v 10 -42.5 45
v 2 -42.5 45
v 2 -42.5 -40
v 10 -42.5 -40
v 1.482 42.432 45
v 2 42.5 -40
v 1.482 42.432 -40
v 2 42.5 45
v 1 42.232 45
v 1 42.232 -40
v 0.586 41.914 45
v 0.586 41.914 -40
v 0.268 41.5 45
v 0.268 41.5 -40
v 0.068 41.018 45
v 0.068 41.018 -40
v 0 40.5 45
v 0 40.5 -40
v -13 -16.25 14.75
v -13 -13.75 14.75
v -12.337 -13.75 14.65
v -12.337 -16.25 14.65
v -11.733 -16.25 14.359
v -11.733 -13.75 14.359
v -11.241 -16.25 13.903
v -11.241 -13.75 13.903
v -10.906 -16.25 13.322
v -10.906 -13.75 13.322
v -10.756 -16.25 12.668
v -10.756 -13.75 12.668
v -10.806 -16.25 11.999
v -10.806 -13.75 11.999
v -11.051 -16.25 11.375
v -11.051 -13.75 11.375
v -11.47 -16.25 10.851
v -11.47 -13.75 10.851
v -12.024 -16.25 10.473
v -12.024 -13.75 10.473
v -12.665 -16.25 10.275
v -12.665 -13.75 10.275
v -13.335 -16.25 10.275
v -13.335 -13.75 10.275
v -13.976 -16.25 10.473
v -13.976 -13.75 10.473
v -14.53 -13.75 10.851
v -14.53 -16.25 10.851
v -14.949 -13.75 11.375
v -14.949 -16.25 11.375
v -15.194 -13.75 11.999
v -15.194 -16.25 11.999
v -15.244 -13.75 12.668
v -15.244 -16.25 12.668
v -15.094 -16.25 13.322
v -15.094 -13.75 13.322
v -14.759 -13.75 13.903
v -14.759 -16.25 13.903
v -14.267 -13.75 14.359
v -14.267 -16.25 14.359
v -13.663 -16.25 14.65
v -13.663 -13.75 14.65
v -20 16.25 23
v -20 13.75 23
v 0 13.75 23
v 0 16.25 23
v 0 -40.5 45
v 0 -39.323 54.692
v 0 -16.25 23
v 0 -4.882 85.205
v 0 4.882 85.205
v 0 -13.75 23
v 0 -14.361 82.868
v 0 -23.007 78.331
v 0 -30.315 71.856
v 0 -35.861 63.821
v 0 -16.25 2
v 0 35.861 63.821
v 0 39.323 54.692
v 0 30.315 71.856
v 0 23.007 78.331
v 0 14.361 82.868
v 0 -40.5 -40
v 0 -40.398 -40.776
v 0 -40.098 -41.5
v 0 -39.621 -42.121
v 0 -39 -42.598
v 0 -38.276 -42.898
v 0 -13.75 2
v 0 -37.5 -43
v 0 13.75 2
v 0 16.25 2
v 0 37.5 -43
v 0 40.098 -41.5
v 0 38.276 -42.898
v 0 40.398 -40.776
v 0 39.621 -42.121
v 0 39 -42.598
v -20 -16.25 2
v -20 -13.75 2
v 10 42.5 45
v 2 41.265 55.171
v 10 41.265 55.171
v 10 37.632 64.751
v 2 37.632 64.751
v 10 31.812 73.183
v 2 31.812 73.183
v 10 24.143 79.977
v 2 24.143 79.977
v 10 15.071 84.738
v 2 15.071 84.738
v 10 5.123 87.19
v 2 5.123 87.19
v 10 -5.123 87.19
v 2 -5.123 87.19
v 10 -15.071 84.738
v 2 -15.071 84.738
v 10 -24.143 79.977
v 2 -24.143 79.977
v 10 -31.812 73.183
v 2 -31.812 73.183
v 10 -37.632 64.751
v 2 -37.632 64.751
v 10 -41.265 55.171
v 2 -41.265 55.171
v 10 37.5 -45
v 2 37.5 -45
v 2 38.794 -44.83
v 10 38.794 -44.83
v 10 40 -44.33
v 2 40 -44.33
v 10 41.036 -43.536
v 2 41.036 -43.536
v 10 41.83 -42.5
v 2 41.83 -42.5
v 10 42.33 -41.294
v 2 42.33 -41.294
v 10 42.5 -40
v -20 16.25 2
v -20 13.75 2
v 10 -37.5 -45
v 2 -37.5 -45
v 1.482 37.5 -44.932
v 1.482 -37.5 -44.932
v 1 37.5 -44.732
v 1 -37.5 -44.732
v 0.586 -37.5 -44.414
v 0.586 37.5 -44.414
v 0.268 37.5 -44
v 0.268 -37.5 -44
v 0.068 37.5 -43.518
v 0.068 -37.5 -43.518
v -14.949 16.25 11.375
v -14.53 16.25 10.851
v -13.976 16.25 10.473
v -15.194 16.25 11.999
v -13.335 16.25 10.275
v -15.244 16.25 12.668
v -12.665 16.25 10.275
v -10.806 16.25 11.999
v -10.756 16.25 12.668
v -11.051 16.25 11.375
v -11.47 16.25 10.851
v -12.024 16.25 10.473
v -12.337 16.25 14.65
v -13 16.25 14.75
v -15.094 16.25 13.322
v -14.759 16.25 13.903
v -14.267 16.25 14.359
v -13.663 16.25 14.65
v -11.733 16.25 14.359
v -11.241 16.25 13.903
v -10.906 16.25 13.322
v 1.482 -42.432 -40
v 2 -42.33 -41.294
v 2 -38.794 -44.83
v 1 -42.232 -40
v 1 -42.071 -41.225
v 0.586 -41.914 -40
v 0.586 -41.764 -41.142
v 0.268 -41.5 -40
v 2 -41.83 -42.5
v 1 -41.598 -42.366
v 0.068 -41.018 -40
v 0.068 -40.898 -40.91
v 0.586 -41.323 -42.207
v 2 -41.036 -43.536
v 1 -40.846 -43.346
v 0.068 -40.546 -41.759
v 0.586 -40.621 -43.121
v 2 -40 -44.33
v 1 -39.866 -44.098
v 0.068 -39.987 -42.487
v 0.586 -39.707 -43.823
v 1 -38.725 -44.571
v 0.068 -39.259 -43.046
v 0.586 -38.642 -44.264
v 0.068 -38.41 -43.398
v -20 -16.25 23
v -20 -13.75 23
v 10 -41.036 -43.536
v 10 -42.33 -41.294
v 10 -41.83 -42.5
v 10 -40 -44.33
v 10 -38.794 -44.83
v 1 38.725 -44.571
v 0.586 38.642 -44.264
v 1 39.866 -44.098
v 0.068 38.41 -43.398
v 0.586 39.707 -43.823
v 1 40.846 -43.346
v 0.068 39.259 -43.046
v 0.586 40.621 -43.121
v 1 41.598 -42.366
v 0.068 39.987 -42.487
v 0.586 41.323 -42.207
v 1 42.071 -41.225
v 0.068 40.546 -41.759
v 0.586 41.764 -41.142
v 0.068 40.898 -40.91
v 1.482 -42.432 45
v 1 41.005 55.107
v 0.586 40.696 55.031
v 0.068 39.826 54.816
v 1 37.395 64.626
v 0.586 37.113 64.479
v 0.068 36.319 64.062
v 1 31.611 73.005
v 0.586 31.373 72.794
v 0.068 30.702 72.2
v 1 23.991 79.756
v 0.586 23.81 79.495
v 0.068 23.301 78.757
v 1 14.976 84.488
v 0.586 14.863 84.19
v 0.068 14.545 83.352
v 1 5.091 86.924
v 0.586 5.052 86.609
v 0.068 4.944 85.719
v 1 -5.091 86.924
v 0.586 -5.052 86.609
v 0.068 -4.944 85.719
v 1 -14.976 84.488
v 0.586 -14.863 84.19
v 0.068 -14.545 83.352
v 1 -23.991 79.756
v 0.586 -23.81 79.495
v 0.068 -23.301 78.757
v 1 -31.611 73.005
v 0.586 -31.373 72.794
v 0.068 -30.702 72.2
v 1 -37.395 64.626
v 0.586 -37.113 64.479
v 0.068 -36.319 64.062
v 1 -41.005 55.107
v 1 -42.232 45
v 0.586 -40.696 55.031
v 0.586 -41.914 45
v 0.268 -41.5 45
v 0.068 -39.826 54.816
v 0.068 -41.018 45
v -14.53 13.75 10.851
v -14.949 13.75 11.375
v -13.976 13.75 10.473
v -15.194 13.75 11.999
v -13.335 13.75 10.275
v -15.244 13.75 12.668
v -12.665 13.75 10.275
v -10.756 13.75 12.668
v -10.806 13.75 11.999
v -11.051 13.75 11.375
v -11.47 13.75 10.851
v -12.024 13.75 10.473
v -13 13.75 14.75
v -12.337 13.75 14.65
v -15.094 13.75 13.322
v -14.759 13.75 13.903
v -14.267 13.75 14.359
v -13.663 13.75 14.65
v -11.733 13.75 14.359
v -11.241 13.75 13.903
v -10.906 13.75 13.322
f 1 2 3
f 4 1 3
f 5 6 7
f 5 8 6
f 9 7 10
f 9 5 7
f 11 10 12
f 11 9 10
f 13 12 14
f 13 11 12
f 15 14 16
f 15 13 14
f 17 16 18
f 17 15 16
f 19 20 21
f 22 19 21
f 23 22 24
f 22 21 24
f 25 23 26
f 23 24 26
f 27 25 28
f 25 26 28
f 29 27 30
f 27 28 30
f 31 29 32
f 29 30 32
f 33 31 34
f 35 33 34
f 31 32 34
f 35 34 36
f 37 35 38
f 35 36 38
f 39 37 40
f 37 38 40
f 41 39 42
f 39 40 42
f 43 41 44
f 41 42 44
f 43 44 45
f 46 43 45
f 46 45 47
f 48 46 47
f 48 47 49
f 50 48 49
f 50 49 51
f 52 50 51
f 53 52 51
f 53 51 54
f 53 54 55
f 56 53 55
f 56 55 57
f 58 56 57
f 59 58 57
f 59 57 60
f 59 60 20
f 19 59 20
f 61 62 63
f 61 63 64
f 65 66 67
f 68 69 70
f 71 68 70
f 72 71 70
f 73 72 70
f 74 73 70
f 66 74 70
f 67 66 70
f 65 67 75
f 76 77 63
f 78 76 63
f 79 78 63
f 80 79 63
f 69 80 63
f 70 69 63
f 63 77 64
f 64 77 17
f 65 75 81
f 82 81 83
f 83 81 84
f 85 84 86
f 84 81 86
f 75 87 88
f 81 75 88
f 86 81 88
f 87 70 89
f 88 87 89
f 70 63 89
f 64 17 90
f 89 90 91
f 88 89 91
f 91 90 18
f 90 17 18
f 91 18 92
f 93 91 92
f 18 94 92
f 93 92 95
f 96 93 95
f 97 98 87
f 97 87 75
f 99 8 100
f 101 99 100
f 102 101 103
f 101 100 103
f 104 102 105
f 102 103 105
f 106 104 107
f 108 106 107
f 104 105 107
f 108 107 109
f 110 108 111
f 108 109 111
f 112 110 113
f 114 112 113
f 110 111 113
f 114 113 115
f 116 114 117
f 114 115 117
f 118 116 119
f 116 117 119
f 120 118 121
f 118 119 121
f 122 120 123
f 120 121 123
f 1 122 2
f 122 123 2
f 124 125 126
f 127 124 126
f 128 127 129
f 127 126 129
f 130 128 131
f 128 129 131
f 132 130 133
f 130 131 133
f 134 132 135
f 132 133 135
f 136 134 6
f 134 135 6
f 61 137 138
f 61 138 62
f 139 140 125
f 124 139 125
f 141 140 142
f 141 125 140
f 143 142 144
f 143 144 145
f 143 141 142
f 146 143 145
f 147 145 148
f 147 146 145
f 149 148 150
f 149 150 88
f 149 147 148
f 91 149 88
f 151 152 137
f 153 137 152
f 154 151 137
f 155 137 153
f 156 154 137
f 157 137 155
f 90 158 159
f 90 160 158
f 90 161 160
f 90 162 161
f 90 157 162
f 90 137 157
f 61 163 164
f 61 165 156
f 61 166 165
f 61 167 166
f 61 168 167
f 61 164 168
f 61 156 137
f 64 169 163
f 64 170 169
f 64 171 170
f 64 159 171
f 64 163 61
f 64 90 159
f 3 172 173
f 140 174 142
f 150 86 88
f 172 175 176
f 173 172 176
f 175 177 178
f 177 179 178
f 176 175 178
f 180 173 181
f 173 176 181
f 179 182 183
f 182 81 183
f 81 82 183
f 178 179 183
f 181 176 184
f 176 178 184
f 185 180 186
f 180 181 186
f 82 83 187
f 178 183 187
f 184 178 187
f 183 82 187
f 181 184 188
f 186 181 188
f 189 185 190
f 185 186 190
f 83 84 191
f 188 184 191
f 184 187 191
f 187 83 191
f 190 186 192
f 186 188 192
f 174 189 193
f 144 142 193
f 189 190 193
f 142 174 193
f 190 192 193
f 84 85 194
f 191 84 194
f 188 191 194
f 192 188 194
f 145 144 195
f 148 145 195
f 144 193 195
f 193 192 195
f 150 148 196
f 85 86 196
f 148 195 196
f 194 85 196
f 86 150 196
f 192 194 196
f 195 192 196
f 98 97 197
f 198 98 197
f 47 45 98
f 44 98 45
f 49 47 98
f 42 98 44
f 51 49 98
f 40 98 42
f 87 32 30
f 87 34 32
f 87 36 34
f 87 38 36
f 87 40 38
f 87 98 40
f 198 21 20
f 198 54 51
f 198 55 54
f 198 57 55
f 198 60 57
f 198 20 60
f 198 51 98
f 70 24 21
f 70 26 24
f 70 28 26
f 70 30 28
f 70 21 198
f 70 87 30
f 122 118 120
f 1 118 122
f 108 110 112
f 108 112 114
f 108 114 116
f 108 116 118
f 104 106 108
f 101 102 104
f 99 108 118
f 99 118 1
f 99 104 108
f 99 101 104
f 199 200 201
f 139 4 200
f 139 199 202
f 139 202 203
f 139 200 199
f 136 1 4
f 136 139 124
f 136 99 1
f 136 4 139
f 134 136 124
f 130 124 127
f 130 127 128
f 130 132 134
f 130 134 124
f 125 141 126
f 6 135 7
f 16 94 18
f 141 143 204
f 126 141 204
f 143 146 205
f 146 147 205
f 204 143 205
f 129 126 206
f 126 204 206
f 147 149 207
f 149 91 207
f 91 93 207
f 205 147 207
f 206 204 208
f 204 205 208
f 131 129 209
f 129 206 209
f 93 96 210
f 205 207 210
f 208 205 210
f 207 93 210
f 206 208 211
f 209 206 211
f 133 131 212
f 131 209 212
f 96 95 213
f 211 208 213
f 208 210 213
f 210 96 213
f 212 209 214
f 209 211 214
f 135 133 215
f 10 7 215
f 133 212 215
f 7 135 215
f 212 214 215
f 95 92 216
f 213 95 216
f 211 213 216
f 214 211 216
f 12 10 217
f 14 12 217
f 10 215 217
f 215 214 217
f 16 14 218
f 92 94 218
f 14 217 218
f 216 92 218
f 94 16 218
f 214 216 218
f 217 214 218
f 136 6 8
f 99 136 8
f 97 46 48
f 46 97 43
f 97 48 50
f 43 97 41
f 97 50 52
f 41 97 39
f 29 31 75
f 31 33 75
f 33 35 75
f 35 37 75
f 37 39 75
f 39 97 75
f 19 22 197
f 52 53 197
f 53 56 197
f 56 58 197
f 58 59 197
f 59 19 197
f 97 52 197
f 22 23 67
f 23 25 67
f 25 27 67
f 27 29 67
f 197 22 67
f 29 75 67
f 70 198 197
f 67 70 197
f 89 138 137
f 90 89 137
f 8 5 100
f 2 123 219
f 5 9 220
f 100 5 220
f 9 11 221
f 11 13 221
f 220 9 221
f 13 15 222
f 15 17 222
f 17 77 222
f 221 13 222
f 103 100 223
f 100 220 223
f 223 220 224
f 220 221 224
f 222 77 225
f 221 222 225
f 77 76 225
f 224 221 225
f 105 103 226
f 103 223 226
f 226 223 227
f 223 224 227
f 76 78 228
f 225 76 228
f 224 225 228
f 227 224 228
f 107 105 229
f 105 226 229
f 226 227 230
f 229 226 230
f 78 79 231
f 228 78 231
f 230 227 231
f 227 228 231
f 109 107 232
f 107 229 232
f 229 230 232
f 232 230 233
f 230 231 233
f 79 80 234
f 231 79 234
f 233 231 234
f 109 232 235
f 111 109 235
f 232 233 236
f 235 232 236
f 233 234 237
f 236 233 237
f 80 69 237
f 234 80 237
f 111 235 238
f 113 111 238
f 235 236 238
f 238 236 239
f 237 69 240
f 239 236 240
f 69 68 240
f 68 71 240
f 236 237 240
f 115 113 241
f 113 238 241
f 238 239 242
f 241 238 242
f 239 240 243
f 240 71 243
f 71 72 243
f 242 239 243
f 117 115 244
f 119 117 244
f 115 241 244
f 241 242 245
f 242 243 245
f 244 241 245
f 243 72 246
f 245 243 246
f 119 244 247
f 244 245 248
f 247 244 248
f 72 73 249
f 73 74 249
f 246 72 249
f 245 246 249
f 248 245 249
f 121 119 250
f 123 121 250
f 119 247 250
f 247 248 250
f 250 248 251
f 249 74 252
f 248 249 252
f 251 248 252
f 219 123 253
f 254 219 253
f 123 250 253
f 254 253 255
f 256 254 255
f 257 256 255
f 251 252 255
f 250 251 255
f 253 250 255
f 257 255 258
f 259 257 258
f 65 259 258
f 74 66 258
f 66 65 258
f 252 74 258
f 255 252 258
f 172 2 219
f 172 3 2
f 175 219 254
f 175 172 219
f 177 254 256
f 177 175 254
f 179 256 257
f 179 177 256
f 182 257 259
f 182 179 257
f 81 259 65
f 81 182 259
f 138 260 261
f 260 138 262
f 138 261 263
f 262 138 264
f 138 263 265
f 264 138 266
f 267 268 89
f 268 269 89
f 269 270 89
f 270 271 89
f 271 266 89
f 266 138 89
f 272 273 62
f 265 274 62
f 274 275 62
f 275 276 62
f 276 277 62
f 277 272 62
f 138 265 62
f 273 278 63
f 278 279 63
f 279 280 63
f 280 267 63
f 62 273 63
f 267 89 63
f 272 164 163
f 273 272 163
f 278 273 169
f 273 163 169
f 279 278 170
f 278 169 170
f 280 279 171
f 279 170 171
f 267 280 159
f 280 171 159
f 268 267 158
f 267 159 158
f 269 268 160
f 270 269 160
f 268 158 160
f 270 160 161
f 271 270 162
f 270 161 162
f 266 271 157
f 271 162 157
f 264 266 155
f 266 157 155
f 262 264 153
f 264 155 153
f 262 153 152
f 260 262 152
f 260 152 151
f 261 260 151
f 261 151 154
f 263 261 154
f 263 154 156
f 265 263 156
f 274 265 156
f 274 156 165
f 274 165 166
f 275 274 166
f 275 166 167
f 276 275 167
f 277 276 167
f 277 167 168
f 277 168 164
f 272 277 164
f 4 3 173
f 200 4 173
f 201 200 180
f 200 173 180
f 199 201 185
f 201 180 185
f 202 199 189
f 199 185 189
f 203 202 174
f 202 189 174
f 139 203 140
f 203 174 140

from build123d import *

# Parameters (mm, degrees)
BOSS_EXTRUDE1_DEPTH = 10
FILLET1_R           = 2
SKETCH2_W           = 21
SKETCH2_H           = 2.5
BOSS_EXTRUDE2_DEPTH = 20
SKETCH3_R           = 2.25
CUT_EXTRUDE1_DEPTH  = 108.274472732


with BuildPart() as part:
    # Sketch1 → Boss-Extrude1 (new body)
    with BuildSketch(Plane(origin=(0, 0, 0), x_dir=(0, 0, -1), z_dir=(1, 0, 0))):
        with BuildLine():
            Line((-45, -42.5), (40, -42.5))
            ThreePointArc((40, -42.5), (43.535533906, -41.035533906), (45, -37.5))
            Line((45, -37.5), (45, 37.5))
            ThreePointArc((45, 37.5), (43.535533906, 41.035533906), (40, 42.5))
            Line((40, 42.5), (-45, 42.5))
            ThreePointArc((-45, 42.5), (-87.5, 0), (-45, -42.5))
        make_face()
    extrude(amount=BOSS_EXTRUDE1_DEPTH)

    # Fillet1
    fillet1_edges = [part.edges().sort_by_distance(p)[0] for p in [
        (0, 42.5, 2.5),
        (0, 41.035533906, -43.535533906),
        (0, 0, -45),
        (0, -41.035533906, -43.535533906),
        (0, -42.5, 2.5),
        (0, 0, 87.5),
    ]]
    fillet(fillet1_edges, radius=FILLET1_R)

    # Sketch2 → Boss-Extrude2 (add)
    with BuildSketch(Plane.ZY):
        with Locations((12.5, 15)):
            Rectangle(SKETCH2_W, SKETCH2_H)
    boss_extrude2 = extrude(amount=BOSS_EXTRUDE2_DEPTH)

    # Mirror1: Boss-Extrude2 across plane
    add(boss_extrude2.mirror(Plane.ZX))

    # Sketch3 → Cut-Extrude1 (cut, through all)
    with BuildSketch(Plane(origin=(0, 16.25, 0), x_dir=(1, 0, 0), z_dir=(0, 1, 0))):
        with Locations(Location((-13, -12.5, 0), (0, 0, 270))):
            Circle(SKETCH3_R)
    extrude(amount=-CUT_EXTRUDE1_DEPTH, mode=Mode.SUBTRACT)


solid = part.part
